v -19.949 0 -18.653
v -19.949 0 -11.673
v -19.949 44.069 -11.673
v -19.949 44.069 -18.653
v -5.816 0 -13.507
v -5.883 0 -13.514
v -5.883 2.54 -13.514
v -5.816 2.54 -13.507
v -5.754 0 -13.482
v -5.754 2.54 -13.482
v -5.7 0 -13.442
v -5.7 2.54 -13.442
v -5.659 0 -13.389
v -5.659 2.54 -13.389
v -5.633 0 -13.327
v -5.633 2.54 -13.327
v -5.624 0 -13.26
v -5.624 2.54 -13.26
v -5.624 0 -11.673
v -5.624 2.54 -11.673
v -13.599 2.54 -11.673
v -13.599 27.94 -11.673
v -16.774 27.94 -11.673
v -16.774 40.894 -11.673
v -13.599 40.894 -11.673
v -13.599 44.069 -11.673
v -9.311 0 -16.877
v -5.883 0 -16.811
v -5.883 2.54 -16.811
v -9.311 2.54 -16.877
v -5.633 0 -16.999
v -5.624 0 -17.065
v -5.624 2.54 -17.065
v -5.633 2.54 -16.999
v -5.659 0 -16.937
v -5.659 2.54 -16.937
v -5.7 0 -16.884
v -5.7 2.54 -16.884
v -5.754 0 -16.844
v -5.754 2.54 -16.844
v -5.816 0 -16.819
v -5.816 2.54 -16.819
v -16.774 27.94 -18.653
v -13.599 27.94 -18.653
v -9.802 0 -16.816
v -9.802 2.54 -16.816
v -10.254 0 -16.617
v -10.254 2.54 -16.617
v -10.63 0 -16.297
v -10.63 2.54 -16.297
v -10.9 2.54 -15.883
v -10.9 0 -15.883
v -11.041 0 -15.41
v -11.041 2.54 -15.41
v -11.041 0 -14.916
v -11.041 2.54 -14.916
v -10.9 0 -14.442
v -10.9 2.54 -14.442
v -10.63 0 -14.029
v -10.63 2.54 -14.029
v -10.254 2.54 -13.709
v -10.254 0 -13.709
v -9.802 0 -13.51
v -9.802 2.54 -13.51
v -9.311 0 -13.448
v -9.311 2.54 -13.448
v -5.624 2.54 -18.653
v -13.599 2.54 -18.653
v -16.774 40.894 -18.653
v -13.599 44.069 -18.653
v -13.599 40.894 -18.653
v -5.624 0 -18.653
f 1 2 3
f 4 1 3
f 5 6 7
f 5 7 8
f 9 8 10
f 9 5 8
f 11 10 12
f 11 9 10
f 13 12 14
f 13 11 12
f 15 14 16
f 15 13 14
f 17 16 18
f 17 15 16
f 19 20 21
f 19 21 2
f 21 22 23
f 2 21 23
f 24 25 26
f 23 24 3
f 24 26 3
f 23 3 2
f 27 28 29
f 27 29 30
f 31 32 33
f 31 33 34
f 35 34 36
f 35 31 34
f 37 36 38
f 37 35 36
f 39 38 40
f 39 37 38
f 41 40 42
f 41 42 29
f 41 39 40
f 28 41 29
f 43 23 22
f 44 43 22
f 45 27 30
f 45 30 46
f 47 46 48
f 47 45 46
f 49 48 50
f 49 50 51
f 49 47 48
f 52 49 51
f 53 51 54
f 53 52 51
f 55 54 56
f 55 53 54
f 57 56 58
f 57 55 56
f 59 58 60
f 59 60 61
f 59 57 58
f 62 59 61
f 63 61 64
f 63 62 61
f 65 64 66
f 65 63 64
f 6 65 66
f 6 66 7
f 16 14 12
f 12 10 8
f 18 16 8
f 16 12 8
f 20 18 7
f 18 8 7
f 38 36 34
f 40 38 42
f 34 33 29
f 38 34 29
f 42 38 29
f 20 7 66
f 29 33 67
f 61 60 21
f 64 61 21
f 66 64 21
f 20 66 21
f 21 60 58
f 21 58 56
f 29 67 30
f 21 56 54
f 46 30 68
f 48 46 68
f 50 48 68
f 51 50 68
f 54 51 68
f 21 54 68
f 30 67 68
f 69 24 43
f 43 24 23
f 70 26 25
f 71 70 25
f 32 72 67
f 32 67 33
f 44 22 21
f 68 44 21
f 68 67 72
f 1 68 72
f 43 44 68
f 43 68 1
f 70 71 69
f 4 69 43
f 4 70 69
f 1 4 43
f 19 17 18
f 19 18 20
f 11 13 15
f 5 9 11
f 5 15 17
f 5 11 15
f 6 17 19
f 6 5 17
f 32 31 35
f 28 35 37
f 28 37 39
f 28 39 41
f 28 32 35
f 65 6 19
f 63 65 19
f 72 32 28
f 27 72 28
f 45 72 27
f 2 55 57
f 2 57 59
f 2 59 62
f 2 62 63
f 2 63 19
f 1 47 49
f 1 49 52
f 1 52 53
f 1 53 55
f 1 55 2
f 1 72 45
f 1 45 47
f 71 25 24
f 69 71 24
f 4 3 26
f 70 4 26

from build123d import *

# Parameters (mm, degrees)
SCREWHOOK_DEPTH        = 2.54
SPACERANDTOPHOOK_DEPTH = 6.980143326


with BuildPart() as part:
    # Sketch1 → ScrewHook (new body)
    with BuildSketch(Plane(origin=(0, 0, 0), x_dir=(1, 0, 0), z_dir=(0, 1, 0))):
        with BuildLine():
            Line((-5.624189629, 11.672719973), (-19.949200128, 11.672719973))
            Line((-19.949200128, 11.672719973), (-19.949200128, 18.652863299))
            Line((-19.949200128, 18.652863299), (-5.624189629, 18.652863299))
            Line((-5.624189629, 18.652863299), (-5.624189629, 17.065363299))
            ThreePointArc((-5.624189629, 17.065363299), (-5.700318254, 16.884041007), (-5.883069737, 16.811410184))
            Line((-5.883069737, 16.811410184), (-9.311436788, 16.877291636))
            ThreePointArc((-9.311436788, 16.877291636), (-11.059200128, 15.162791636), (-9.311436788, 13.448291636))
            Line((-9.311436788, 13.448291636), (-5.883069737, 13.514173088))
            ThreePointArc((-5.883069737, 13.514173088), (-5.700318254, 13.441542265), (-5.624189629, 13.260219973))
            Line((-5.624189629, 13.260219973), (-5.624189629, 11.672719973))
        make_face()
    extrude(amount=SCREWHOOK_DEPTH)

    # Sketch3 → SpacerAndTopHook (add)
    with BuildSketch(Plane.XY.offset(-11.672719973)):
        Polygon((-19.949200128, 2.54), (-19.949200128, 44.069), (-13.599200128, 44.069), (-13.599200128, 40.894), (-16.774200128, 40.894), (-16.774200128, 27.94), (-13.599200128, 27.94), (-13.599200128, 2.54), align=None)
    extrude(amount=-SPACERANDTOPHOOK_DEPTH)


solid = part.part
